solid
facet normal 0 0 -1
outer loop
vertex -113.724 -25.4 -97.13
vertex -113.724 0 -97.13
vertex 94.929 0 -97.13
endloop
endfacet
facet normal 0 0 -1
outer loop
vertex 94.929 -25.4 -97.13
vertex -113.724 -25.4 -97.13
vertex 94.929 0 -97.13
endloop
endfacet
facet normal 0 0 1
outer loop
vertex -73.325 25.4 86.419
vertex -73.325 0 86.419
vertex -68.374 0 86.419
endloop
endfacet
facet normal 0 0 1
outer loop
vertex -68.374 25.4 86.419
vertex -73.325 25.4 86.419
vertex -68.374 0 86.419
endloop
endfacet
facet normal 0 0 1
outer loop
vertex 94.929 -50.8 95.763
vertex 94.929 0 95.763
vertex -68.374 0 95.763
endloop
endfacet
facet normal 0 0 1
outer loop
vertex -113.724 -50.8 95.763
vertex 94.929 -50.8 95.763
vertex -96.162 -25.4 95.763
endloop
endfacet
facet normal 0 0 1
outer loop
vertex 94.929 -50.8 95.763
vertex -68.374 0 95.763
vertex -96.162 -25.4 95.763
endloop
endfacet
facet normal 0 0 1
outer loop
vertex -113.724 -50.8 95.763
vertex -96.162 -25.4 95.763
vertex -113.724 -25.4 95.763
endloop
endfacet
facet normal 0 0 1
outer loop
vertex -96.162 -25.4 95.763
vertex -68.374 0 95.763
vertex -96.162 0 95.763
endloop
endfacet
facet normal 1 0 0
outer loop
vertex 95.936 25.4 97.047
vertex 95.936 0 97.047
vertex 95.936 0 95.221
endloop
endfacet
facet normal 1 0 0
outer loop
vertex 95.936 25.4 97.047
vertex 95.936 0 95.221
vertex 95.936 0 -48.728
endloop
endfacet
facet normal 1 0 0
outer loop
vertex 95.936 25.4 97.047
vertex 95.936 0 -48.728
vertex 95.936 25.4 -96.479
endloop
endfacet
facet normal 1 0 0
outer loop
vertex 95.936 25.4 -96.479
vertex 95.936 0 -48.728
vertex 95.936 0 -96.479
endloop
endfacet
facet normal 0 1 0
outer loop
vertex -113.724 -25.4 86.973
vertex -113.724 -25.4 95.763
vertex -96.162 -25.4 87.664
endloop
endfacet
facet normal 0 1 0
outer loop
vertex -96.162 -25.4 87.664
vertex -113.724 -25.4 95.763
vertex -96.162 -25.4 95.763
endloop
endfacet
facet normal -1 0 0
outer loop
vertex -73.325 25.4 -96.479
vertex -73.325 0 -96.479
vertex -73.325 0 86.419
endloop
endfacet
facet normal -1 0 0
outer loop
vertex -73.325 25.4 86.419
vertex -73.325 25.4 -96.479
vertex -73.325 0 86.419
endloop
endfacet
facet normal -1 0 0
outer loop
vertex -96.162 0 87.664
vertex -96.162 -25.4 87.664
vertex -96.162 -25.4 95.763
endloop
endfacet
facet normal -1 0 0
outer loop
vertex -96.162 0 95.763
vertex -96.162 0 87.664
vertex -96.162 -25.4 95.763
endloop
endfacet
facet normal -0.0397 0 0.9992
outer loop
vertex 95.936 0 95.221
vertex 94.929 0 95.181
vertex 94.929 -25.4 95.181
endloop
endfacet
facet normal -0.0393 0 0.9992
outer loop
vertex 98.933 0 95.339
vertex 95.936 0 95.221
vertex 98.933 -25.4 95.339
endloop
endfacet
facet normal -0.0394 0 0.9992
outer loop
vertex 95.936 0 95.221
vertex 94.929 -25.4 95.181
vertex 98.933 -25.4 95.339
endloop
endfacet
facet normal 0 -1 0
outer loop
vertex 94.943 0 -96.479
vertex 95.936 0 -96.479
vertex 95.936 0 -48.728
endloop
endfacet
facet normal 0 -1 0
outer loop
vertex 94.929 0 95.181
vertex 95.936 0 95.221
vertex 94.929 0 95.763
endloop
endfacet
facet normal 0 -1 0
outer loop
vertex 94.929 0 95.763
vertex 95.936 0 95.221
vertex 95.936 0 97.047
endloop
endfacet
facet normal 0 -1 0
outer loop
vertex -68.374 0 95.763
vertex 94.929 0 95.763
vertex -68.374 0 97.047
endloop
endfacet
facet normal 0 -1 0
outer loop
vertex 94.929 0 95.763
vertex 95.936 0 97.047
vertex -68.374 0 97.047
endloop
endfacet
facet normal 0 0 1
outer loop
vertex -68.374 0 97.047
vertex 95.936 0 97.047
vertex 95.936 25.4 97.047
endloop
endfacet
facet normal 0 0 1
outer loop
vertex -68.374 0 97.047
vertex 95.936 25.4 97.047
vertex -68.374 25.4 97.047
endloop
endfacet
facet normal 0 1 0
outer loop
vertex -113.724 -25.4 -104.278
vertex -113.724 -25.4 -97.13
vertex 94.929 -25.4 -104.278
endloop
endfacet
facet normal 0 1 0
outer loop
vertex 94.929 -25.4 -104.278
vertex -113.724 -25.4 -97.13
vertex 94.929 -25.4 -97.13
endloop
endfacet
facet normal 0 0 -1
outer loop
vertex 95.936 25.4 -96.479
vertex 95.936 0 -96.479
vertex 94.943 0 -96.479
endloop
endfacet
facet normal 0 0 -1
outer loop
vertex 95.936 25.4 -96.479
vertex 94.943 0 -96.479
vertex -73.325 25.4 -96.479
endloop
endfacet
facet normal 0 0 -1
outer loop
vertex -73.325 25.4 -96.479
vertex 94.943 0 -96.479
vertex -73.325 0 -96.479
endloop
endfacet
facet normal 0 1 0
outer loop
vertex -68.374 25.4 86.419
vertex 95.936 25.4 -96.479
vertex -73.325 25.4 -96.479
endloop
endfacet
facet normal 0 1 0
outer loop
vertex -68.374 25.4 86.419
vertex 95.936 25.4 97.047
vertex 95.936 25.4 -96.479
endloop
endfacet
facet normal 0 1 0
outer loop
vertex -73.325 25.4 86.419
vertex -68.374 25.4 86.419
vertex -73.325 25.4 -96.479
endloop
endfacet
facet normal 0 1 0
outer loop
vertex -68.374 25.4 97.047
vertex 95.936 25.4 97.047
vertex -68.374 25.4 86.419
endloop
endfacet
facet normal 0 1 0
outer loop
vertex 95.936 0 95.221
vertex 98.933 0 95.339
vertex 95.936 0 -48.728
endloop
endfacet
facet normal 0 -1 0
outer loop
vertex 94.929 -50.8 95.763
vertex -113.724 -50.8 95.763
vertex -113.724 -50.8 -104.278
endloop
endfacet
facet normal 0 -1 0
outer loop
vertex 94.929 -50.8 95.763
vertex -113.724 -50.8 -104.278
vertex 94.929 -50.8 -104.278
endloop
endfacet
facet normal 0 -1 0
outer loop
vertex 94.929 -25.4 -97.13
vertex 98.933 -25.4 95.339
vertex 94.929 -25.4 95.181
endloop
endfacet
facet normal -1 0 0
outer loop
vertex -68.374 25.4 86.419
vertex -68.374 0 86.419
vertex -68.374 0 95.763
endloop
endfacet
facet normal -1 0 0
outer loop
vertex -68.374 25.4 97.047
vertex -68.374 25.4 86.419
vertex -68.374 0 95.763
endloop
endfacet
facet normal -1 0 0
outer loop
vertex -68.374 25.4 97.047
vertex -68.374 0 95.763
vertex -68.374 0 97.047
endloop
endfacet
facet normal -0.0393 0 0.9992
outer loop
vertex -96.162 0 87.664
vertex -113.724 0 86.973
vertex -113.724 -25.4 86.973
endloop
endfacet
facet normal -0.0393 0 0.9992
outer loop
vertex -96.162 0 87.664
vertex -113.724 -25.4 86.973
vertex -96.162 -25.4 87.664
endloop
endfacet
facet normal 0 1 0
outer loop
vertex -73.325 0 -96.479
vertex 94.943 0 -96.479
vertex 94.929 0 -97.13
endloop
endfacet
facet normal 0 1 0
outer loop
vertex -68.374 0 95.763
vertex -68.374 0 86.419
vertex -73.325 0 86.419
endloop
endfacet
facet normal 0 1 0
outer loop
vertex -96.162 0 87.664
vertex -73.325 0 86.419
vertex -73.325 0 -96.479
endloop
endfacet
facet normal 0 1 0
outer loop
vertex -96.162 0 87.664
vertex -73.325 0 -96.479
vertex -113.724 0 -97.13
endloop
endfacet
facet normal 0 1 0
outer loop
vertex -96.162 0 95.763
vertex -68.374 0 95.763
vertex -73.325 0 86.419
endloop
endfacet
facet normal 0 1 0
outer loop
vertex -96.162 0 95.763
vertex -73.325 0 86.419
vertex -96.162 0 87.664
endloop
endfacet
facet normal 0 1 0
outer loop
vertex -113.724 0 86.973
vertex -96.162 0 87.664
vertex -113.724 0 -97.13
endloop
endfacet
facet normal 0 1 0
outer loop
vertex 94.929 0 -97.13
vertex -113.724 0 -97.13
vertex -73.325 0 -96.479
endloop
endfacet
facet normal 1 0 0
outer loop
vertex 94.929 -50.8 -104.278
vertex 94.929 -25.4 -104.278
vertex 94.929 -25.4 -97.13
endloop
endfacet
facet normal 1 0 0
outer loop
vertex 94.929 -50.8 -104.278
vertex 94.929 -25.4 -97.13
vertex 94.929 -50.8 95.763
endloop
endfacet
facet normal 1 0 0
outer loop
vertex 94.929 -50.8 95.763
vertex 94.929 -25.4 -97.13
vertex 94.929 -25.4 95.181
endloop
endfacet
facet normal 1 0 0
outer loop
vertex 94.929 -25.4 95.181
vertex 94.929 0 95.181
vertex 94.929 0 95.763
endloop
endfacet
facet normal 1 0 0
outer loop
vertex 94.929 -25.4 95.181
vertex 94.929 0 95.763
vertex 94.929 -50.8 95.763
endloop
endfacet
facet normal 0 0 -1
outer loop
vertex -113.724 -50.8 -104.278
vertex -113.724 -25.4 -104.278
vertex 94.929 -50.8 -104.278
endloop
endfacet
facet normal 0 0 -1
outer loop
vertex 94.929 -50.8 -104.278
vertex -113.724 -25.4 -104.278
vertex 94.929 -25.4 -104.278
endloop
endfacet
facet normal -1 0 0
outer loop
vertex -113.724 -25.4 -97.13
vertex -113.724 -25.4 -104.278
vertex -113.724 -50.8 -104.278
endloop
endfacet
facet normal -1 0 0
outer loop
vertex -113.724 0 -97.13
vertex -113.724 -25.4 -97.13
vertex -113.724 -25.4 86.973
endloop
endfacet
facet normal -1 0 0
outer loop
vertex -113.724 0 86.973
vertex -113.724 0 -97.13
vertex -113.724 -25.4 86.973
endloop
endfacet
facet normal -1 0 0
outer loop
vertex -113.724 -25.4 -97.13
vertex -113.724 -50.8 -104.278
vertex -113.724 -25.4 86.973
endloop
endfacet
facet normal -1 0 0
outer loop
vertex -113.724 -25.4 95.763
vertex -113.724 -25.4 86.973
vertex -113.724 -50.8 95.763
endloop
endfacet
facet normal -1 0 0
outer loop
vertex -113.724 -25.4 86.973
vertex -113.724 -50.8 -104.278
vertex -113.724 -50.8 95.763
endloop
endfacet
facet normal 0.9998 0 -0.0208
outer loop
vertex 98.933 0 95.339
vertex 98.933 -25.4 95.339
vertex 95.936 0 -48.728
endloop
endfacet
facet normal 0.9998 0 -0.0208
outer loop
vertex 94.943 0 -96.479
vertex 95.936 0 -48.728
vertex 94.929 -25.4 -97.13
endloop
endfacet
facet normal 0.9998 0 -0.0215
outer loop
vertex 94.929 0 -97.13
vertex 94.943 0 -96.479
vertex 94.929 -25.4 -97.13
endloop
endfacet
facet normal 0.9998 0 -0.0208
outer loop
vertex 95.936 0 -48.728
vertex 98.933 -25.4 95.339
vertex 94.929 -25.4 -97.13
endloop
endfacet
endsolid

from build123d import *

# Parameters (mm, degrees)
F0_W      = 191.0914182663
F0_H      = 192.8930431604
F1_DEPTH  = 25.4
F2_W      = 25.4
F2_H      = 25.5114277713
F3_DEPTH  = 25.4
F4_W      = 125.7558986545
F4_H      = 7.1474313736
F4_H_2    = 192.8930431604
F4_W_2    = 50.9491413832
F5_DEPTH  = 25.4
F7_DEPTH  = 25.4
F9_W      = 164.3103808165
F9_H      = 10.6280595064
F10_DEPTH = 25.4


with BuildPart() as f1:
    # F0 (on Front) → F1 (new body)
    with BuildSketch(Plane.XZ):
        with Locations((-0.6164610386, -0.6837919354)):
            Rectangle(F0_W, F0_H)
        Polygon((0, 75.5859687924), (74.6201202273, 75.5859687924), (74.6201202273, 11.123508215), (81.607028842, -13.4125072509), (74.6201202273, -13.2084926445), (74.6201202273, -76.0672464967), (0, -76.0672464967), (-77.7053460479, -76.0672464967), (-77.7053460479, -8.7606571615), (-77.7053460479, 12.5154424459), (-77.7053460479, 75.5859687924), align=None, mode=Mode.SUBTRACT)
    extrude(amount=F1_DEPTH)

    # F2 (on face) → F3 (join)
    with BuildSketch(Plane(origin=(71.9530620256, 0, 20.4894502783), x_dir=(0, -1, 0), z_dir=(-0.9617656717, 0, -0.2738736803))):
        with Locations((12.7, -22.4939924905)):
            Rectangle(F2_W, F2_H)
    extrude(amount=F3_DEPTH)

    # F4 (on face) → F5 (join)
    with BuildSketch(Plane.XZ.offset(25.4)):
        with Locations((32.0512987673, -100.7040292025)):
            Rectangle(F4_W, F4_H)
        with Locations((32.0512987673, -0.6837919354)):
            Rectangle(F4_W, F4_H_2)
        Polygon((-30.8266505599, -104.2777448893), (-30.8266505599, -97.1303135157), (-81.7757919431, -97.1303135157), (-81.7757919431, 95.7627296448), (-113.723911345, 95.7627296448), (-113.723911345, -104.2777448893), align=None)
        with Locations((-56.3012212515, -0.6837919354)):
            Rectangle(F4_W_2, F4_H_2)
    extrude(amount=F5_DEPTH)

    # F6 (on face) → F7 (join)
    with BuildSketch(Plane(origin=(0, -25.4, 0), x_dir=(-1, 0, 0), z_dir=(0, 1, 0))):
        Polygon((-98.9333018661, 95.3389704227), (-94.9292480946, -97.1303135157), (113.723911345, -97.1303135157), (113.723911345, 86.9726911187), align=None)
    extrude(amount=F7_DEPTH)

    # F9 (on face) → F10 (join)
    with BuildSketch(Plane(origin=(0, 0, 0), x_dir=(-1, 0, 0), z_dir=(0, 1, 0))):
        Polygon((-95.9361866117, 86.4189863205), (-95.9361866117, -96.4786112309), (73.3251571655, -96.4786112309), (73.3251571655, 86.4189863205), (68.3741942048, 86.4189863205), align=None)
        with Locations((-13.7809962034, 91.7330160737)):
            Rectangle(F9_W, F9_H)
    extrude(amount=F10_DEPTH)


solid = f1.part
